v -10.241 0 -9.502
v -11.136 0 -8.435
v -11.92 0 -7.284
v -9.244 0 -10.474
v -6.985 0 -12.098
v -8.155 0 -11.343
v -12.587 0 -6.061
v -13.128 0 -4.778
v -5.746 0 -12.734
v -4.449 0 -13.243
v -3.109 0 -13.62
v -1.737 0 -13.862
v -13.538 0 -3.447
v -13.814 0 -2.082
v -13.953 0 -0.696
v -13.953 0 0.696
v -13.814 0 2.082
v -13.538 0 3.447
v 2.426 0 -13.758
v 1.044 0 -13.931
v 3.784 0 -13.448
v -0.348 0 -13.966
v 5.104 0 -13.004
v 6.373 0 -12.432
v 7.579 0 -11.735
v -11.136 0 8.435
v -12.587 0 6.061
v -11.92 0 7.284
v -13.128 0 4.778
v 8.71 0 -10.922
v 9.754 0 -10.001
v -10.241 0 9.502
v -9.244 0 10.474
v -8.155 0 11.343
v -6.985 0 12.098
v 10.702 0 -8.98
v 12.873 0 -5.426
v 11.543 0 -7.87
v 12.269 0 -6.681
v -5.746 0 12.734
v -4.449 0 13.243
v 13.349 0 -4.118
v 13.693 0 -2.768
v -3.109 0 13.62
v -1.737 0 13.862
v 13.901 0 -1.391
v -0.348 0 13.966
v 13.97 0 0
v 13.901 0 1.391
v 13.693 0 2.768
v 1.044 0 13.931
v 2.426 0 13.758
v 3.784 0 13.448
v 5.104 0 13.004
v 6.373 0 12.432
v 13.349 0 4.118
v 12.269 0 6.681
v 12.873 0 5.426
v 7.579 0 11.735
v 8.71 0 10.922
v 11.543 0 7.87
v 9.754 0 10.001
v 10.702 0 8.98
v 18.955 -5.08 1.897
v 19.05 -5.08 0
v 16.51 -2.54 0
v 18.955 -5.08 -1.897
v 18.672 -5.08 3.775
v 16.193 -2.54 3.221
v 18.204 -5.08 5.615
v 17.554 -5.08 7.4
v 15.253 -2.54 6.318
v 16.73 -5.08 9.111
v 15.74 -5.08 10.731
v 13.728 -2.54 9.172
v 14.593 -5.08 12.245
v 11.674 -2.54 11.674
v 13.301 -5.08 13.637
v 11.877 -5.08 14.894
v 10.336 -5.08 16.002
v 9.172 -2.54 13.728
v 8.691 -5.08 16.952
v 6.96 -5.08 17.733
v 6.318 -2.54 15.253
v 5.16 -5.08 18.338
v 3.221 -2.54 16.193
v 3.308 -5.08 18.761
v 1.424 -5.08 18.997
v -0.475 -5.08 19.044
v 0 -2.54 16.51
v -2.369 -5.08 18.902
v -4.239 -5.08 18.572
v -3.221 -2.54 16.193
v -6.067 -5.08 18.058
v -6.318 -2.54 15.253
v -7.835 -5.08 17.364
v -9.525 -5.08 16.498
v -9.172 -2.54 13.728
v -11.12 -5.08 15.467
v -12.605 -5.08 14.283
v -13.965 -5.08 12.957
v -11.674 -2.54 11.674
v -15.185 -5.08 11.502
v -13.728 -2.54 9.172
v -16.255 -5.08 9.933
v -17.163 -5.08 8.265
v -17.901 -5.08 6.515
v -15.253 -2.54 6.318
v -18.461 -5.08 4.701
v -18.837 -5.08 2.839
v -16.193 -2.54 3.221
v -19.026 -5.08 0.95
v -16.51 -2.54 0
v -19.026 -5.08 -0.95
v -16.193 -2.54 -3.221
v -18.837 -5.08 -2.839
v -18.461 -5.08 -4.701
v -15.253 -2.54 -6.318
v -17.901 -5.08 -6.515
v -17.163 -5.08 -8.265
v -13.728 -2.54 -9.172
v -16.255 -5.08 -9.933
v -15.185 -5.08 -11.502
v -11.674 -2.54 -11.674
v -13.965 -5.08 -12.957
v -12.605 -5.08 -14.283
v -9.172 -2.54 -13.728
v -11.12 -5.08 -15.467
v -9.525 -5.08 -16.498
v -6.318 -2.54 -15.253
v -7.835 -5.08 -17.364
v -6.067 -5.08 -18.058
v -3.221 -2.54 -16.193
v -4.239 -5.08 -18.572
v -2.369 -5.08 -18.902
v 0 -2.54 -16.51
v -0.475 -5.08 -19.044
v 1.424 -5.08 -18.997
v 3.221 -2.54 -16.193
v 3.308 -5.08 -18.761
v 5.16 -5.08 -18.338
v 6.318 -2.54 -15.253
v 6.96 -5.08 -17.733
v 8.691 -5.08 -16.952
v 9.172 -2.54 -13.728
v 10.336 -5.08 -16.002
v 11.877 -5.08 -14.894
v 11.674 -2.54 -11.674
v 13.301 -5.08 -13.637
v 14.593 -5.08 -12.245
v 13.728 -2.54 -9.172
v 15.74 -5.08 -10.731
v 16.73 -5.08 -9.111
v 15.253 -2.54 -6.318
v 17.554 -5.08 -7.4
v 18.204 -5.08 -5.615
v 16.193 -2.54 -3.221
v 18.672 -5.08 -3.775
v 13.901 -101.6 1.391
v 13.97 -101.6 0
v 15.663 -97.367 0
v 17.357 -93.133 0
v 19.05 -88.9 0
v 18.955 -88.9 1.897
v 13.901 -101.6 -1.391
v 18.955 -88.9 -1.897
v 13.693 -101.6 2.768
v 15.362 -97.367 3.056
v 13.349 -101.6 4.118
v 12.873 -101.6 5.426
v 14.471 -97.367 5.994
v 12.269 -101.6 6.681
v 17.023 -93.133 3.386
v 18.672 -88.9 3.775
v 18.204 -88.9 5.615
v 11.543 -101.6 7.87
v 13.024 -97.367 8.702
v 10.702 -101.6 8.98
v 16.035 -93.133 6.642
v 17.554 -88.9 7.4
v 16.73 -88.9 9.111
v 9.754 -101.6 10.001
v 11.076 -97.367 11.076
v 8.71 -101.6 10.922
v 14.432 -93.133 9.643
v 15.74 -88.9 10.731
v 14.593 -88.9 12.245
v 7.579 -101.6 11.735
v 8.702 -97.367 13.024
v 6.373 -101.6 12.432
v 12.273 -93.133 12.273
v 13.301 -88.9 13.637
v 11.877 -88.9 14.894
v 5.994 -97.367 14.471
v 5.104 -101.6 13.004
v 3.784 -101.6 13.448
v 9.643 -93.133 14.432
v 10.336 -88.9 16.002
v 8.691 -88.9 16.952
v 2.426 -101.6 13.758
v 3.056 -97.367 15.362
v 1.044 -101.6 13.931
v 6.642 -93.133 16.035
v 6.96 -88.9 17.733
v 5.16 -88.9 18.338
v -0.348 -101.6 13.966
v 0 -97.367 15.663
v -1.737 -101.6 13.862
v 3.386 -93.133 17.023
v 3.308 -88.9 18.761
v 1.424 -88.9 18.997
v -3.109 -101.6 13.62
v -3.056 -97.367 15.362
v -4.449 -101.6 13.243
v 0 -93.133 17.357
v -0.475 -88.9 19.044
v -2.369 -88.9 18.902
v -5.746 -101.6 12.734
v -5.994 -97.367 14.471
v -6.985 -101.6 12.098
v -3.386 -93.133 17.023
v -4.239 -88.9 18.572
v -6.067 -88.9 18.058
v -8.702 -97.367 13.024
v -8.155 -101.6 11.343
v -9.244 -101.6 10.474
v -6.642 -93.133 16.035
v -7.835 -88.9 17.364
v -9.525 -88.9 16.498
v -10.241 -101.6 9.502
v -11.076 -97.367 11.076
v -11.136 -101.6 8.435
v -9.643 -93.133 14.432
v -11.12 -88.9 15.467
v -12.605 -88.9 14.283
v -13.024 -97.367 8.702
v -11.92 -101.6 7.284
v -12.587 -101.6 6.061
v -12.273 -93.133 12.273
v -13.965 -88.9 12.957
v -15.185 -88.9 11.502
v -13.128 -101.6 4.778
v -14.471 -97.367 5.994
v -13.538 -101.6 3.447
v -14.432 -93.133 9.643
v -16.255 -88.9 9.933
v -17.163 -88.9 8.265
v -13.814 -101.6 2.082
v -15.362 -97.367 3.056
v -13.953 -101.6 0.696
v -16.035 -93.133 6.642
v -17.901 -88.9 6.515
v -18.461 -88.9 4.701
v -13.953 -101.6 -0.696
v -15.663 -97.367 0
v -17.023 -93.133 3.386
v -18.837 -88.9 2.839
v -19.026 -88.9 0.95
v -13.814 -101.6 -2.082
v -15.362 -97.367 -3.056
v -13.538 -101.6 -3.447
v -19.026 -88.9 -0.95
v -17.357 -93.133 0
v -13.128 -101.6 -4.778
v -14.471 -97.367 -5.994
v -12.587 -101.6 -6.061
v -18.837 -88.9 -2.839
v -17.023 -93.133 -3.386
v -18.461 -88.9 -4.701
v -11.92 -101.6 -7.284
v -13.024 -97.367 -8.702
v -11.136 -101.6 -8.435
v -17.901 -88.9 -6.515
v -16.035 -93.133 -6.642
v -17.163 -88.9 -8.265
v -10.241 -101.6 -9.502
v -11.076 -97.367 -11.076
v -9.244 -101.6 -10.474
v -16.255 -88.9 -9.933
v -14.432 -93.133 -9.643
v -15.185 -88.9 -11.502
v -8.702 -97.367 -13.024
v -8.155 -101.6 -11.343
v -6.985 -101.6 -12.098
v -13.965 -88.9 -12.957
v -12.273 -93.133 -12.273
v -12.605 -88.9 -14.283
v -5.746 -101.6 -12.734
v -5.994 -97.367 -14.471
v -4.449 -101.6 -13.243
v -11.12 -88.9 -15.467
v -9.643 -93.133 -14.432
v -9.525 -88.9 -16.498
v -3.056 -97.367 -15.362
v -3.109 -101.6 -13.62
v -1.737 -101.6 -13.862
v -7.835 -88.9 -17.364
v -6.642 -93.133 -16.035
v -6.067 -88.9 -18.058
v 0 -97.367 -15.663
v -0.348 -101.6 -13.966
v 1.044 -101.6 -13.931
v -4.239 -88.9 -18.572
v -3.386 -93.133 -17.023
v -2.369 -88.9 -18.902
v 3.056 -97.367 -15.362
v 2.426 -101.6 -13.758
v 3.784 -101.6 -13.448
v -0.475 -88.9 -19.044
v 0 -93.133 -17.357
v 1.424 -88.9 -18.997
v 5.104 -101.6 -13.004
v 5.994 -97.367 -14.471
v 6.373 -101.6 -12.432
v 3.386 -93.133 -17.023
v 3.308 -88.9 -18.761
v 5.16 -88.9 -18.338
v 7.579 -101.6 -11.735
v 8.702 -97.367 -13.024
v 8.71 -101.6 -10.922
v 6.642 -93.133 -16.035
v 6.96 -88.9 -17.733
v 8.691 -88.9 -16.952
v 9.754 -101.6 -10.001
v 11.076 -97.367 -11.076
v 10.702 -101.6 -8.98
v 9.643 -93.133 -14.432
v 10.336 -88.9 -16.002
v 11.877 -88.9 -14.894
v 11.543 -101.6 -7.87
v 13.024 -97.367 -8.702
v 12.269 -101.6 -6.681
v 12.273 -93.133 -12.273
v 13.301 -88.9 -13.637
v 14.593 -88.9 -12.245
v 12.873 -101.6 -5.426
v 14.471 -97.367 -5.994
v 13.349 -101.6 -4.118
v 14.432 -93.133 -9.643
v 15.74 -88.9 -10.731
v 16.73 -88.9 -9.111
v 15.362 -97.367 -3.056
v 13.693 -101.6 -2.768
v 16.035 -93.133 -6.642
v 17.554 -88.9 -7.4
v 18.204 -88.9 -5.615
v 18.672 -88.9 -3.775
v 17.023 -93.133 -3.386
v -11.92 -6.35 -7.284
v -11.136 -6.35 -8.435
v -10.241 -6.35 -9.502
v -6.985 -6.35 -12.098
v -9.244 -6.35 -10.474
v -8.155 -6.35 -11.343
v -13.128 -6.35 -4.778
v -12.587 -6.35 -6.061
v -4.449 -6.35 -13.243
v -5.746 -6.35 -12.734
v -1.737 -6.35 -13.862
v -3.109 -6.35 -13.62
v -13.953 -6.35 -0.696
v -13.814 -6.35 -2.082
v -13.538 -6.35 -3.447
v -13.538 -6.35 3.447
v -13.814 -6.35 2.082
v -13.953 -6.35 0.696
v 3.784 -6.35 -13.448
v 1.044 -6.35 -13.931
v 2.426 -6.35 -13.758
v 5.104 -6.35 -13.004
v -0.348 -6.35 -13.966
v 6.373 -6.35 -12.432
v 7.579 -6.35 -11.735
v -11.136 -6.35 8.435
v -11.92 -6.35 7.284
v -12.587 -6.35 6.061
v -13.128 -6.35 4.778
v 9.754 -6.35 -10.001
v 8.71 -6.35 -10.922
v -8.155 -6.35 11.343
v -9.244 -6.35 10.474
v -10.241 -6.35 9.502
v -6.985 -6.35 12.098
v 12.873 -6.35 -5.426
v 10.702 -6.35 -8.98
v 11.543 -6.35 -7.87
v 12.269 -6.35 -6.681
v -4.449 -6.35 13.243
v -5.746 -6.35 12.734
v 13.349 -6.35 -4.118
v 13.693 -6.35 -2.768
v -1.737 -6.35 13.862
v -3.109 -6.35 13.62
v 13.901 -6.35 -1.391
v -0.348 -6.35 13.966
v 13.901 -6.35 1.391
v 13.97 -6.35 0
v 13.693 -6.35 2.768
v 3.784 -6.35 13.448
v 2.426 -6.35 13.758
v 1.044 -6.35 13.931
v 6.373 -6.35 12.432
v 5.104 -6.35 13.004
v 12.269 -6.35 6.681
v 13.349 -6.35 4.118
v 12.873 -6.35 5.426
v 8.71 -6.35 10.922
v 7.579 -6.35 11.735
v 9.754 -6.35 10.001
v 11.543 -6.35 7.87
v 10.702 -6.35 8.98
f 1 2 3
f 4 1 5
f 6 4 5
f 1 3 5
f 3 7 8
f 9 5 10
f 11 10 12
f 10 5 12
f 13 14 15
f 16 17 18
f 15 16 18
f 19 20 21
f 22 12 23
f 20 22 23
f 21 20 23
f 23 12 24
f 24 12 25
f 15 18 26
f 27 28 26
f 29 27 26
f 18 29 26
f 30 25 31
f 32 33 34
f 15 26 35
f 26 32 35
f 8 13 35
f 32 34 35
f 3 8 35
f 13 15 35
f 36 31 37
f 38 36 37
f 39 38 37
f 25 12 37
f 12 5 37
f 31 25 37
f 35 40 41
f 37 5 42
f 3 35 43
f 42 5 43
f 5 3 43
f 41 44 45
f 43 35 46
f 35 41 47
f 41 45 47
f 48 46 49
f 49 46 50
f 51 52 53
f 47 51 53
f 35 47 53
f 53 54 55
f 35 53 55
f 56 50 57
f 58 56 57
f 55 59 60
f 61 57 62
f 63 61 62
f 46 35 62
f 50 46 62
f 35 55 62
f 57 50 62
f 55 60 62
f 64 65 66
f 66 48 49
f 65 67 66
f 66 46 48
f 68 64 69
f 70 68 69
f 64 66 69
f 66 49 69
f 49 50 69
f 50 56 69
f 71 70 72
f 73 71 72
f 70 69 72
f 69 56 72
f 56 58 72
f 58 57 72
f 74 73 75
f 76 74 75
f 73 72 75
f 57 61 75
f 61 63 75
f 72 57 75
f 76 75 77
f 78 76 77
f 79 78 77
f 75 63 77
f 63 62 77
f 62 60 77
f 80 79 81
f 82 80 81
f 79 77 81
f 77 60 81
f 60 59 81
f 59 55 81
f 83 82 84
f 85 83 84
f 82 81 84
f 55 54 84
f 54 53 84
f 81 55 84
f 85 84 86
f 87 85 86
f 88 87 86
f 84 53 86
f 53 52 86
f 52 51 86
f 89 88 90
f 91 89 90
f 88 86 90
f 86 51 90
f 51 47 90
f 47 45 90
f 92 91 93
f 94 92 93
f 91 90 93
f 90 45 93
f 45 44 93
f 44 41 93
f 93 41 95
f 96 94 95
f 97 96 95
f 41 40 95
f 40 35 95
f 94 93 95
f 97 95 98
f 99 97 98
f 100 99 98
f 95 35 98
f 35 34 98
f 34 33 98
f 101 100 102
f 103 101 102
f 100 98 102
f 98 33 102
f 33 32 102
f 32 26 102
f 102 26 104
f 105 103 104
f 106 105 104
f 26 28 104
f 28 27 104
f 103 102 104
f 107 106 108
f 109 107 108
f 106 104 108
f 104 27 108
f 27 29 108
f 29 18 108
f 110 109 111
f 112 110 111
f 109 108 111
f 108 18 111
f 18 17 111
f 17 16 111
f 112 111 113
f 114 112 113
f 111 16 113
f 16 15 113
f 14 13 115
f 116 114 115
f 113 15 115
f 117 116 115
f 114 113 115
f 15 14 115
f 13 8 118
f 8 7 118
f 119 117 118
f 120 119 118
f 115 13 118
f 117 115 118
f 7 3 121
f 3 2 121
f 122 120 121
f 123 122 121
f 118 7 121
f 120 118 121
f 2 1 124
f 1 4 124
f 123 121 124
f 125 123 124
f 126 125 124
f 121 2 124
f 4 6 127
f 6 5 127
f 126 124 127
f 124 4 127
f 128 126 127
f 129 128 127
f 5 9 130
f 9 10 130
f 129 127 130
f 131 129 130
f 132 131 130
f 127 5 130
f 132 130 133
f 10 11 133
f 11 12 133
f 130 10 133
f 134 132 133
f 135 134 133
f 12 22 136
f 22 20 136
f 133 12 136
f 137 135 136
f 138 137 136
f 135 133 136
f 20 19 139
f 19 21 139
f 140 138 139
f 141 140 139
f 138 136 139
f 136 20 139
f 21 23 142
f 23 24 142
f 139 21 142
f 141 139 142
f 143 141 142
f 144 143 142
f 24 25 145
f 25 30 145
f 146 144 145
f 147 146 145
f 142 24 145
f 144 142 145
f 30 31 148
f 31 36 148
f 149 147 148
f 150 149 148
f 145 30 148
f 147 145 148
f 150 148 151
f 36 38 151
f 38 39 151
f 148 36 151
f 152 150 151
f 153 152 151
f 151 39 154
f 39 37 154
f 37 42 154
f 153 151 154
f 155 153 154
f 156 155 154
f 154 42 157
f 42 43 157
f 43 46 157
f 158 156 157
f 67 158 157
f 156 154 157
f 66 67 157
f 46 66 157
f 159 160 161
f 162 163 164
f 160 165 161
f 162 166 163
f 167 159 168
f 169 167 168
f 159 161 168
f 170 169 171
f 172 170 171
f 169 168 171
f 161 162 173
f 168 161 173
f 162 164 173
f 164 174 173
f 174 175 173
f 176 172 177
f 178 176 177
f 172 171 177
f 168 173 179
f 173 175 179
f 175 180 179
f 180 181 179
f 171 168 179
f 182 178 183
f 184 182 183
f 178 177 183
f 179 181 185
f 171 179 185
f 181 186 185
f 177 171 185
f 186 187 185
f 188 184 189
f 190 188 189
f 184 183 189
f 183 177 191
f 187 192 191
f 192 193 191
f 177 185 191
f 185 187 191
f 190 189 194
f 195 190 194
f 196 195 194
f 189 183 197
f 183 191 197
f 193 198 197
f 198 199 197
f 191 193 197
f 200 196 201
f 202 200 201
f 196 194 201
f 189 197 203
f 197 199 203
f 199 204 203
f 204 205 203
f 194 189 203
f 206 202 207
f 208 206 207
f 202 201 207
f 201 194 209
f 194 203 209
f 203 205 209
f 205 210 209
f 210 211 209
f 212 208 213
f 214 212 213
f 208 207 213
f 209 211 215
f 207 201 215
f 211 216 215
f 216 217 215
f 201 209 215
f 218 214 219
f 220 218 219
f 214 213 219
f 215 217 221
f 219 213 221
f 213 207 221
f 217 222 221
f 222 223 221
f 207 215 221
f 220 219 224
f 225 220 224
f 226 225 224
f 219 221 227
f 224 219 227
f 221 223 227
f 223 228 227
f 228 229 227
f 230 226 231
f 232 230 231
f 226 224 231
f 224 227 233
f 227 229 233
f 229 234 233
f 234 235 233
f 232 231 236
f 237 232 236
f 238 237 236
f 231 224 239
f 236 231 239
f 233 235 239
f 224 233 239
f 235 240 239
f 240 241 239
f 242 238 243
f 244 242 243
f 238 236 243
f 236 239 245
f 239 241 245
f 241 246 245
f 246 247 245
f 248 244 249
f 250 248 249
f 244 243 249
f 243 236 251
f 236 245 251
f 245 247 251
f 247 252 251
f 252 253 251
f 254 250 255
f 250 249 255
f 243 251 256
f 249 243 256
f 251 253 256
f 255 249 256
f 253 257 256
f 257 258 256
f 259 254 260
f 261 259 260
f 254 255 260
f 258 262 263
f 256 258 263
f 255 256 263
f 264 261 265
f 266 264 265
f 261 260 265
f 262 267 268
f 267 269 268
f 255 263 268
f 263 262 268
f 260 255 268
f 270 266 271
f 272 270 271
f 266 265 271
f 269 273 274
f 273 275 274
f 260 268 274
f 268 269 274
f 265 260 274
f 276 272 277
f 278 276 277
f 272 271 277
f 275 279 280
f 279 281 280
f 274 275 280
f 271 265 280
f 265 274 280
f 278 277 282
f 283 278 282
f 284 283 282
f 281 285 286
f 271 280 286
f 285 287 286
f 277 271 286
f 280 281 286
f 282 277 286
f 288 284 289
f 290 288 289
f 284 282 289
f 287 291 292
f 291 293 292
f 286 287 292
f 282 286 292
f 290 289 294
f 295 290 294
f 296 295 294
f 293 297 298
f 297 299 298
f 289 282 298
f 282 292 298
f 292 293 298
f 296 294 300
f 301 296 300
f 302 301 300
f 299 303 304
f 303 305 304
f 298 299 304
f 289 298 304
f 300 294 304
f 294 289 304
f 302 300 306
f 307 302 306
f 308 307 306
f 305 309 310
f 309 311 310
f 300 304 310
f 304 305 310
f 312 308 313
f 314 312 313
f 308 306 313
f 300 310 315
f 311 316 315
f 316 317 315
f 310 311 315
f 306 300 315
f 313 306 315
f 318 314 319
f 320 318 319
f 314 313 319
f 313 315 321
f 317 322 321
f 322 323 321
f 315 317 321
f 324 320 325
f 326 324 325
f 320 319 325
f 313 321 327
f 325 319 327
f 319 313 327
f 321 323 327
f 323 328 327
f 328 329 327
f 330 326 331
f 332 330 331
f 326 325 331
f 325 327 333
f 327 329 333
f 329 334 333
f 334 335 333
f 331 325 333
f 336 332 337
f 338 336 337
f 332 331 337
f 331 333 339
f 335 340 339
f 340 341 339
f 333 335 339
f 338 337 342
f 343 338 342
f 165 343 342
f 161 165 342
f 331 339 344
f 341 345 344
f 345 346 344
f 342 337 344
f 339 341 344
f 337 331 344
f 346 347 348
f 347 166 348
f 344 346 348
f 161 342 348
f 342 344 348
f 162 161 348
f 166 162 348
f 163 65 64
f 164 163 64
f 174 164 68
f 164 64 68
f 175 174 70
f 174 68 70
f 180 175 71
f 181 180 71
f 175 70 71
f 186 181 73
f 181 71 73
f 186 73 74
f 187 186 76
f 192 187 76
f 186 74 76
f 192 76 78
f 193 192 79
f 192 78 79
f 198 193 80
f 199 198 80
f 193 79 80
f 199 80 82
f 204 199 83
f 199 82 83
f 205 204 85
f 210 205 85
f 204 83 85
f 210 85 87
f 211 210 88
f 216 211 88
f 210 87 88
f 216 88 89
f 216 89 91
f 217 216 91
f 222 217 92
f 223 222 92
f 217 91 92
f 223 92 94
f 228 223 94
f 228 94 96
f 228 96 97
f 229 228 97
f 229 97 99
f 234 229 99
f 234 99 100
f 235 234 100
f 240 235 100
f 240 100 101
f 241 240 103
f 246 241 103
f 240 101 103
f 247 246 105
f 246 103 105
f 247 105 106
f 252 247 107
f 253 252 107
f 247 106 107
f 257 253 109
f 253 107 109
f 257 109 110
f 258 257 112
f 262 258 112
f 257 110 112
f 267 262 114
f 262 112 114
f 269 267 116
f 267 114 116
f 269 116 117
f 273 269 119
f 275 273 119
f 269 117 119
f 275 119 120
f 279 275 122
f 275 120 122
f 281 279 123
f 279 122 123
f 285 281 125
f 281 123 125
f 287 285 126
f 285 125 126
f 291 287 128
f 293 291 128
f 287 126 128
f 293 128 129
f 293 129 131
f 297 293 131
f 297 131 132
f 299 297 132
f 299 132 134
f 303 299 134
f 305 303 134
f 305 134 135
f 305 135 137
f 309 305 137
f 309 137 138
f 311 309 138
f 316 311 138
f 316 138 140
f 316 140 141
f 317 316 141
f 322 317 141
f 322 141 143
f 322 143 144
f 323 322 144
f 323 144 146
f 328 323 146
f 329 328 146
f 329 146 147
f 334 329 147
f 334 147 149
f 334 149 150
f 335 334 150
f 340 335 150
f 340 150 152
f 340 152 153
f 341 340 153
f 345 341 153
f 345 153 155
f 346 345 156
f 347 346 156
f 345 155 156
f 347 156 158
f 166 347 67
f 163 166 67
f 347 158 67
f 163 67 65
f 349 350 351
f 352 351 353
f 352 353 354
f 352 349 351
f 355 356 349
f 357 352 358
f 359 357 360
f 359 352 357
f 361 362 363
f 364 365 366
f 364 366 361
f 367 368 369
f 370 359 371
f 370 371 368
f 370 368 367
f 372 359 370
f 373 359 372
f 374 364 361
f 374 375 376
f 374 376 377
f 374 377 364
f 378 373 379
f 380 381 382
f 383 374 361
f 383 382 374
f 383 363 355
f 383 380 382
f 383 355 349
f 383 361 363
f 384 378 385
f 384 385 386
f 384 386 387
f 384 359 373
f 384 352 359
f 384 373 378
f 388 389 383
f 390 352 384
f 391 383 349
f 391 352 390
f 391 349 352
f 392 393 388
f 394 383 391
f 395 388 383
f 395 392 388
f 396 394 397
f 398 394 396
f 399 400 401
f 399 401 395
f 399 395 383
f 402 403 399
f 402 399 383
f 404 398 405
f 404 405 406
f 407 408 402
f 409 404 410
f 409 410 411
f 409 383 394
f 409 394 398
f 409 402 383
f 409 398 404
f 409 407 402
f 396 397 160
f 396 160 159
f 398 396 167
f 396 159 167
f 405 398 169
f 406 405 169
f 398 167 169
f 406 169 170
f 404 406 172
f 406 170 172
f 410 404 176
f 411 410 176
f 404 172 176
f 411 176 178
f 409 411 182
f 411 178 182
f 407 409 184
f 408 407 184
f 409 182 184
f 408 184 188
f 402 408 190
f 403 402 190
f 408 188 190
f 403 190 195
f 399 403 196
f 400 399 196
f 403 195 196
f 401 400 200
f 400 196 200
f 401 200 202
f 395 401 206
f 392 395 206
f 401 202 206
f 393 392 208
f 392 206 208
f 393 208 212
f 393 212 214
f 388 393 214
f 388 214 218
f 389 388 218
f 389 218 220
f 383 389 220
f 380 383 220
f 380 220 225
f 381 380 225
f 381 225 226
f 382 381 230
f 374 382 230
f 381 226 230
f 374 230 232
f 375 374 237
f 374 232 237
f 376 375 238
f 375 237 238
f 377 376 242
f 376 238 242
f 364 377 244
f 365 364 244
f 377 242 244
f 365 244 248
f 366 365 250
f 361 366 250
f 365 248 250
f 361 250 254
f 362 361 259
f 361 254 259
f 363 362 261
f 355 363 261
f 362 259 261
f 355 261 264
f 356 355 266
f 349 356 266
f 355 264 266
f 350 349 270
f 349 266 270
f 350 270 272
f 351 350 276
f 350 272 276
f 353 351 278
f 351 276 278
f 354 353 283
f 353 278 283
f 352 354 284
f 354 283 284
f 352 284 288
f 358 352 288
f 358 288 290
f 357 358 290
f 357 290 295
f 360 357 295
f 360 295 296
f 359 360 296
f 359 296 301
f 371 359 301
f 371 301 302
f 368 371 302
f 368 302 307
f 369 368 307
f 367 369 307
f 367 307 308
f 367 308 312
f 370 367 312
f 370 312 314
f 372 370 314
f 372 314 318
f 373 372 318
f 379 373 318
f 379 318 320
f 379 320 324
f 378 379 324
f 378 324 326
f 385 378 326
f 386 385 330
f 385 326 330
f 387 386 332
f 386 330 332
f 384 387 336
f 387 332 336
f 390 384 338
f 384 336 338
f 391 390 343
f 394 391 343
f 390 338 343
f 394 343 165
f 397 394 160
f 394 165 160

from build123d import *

# Parameters (mm, degrees)
F0_R     = 19.05
F0_R_2   = 12.7
F1_DEPTH = 101.6
F2_SIZE2 = 12.7
F2_SIZE  = 5.08
F3_DEPTH = 95.25
F4_SIZE  = 5.08


with BuildPart() as f1:
    # F0 (on Front) → F1 (new body)
    with BuildSketch(Plane.XZ):
        Circle(F0_R)
        Circle(F0_R_2, mode=Mode.SUBTRACT)
        Circle(F0_R_2)
    extrude(amount=F1_DEPTH)

    # F2
    f2_edges = [f1.edges().sort_by_distance(p)[0] for p in [
        (-19.05, -101.6, 0),
    ]]
    f2_side = f1.faces().sort_by_distance((0, -101.6, 0))[0]
    chamfer(f2_edges, length=F2_SIZE, length2=F2_SIZE2, reference=f2_side)

    # F3 (cut): a face of the model
    f3_faces = [f1.faces().sort_by_distance(p)[0] for p in [
        (0, -101.6, 0),
    ]]
    extrude(f3_faces, amount=-F3_DEPTH, mode=Mode.SUBTRACT)

    # F4
    f4_edges = [f1.edges().sort_by_distance(p)[0] for p in [
        (-19.05, 0, 0),
    ]]
    chamfer(f4_edges, length=F4_SIZE)


solid = f1.part
